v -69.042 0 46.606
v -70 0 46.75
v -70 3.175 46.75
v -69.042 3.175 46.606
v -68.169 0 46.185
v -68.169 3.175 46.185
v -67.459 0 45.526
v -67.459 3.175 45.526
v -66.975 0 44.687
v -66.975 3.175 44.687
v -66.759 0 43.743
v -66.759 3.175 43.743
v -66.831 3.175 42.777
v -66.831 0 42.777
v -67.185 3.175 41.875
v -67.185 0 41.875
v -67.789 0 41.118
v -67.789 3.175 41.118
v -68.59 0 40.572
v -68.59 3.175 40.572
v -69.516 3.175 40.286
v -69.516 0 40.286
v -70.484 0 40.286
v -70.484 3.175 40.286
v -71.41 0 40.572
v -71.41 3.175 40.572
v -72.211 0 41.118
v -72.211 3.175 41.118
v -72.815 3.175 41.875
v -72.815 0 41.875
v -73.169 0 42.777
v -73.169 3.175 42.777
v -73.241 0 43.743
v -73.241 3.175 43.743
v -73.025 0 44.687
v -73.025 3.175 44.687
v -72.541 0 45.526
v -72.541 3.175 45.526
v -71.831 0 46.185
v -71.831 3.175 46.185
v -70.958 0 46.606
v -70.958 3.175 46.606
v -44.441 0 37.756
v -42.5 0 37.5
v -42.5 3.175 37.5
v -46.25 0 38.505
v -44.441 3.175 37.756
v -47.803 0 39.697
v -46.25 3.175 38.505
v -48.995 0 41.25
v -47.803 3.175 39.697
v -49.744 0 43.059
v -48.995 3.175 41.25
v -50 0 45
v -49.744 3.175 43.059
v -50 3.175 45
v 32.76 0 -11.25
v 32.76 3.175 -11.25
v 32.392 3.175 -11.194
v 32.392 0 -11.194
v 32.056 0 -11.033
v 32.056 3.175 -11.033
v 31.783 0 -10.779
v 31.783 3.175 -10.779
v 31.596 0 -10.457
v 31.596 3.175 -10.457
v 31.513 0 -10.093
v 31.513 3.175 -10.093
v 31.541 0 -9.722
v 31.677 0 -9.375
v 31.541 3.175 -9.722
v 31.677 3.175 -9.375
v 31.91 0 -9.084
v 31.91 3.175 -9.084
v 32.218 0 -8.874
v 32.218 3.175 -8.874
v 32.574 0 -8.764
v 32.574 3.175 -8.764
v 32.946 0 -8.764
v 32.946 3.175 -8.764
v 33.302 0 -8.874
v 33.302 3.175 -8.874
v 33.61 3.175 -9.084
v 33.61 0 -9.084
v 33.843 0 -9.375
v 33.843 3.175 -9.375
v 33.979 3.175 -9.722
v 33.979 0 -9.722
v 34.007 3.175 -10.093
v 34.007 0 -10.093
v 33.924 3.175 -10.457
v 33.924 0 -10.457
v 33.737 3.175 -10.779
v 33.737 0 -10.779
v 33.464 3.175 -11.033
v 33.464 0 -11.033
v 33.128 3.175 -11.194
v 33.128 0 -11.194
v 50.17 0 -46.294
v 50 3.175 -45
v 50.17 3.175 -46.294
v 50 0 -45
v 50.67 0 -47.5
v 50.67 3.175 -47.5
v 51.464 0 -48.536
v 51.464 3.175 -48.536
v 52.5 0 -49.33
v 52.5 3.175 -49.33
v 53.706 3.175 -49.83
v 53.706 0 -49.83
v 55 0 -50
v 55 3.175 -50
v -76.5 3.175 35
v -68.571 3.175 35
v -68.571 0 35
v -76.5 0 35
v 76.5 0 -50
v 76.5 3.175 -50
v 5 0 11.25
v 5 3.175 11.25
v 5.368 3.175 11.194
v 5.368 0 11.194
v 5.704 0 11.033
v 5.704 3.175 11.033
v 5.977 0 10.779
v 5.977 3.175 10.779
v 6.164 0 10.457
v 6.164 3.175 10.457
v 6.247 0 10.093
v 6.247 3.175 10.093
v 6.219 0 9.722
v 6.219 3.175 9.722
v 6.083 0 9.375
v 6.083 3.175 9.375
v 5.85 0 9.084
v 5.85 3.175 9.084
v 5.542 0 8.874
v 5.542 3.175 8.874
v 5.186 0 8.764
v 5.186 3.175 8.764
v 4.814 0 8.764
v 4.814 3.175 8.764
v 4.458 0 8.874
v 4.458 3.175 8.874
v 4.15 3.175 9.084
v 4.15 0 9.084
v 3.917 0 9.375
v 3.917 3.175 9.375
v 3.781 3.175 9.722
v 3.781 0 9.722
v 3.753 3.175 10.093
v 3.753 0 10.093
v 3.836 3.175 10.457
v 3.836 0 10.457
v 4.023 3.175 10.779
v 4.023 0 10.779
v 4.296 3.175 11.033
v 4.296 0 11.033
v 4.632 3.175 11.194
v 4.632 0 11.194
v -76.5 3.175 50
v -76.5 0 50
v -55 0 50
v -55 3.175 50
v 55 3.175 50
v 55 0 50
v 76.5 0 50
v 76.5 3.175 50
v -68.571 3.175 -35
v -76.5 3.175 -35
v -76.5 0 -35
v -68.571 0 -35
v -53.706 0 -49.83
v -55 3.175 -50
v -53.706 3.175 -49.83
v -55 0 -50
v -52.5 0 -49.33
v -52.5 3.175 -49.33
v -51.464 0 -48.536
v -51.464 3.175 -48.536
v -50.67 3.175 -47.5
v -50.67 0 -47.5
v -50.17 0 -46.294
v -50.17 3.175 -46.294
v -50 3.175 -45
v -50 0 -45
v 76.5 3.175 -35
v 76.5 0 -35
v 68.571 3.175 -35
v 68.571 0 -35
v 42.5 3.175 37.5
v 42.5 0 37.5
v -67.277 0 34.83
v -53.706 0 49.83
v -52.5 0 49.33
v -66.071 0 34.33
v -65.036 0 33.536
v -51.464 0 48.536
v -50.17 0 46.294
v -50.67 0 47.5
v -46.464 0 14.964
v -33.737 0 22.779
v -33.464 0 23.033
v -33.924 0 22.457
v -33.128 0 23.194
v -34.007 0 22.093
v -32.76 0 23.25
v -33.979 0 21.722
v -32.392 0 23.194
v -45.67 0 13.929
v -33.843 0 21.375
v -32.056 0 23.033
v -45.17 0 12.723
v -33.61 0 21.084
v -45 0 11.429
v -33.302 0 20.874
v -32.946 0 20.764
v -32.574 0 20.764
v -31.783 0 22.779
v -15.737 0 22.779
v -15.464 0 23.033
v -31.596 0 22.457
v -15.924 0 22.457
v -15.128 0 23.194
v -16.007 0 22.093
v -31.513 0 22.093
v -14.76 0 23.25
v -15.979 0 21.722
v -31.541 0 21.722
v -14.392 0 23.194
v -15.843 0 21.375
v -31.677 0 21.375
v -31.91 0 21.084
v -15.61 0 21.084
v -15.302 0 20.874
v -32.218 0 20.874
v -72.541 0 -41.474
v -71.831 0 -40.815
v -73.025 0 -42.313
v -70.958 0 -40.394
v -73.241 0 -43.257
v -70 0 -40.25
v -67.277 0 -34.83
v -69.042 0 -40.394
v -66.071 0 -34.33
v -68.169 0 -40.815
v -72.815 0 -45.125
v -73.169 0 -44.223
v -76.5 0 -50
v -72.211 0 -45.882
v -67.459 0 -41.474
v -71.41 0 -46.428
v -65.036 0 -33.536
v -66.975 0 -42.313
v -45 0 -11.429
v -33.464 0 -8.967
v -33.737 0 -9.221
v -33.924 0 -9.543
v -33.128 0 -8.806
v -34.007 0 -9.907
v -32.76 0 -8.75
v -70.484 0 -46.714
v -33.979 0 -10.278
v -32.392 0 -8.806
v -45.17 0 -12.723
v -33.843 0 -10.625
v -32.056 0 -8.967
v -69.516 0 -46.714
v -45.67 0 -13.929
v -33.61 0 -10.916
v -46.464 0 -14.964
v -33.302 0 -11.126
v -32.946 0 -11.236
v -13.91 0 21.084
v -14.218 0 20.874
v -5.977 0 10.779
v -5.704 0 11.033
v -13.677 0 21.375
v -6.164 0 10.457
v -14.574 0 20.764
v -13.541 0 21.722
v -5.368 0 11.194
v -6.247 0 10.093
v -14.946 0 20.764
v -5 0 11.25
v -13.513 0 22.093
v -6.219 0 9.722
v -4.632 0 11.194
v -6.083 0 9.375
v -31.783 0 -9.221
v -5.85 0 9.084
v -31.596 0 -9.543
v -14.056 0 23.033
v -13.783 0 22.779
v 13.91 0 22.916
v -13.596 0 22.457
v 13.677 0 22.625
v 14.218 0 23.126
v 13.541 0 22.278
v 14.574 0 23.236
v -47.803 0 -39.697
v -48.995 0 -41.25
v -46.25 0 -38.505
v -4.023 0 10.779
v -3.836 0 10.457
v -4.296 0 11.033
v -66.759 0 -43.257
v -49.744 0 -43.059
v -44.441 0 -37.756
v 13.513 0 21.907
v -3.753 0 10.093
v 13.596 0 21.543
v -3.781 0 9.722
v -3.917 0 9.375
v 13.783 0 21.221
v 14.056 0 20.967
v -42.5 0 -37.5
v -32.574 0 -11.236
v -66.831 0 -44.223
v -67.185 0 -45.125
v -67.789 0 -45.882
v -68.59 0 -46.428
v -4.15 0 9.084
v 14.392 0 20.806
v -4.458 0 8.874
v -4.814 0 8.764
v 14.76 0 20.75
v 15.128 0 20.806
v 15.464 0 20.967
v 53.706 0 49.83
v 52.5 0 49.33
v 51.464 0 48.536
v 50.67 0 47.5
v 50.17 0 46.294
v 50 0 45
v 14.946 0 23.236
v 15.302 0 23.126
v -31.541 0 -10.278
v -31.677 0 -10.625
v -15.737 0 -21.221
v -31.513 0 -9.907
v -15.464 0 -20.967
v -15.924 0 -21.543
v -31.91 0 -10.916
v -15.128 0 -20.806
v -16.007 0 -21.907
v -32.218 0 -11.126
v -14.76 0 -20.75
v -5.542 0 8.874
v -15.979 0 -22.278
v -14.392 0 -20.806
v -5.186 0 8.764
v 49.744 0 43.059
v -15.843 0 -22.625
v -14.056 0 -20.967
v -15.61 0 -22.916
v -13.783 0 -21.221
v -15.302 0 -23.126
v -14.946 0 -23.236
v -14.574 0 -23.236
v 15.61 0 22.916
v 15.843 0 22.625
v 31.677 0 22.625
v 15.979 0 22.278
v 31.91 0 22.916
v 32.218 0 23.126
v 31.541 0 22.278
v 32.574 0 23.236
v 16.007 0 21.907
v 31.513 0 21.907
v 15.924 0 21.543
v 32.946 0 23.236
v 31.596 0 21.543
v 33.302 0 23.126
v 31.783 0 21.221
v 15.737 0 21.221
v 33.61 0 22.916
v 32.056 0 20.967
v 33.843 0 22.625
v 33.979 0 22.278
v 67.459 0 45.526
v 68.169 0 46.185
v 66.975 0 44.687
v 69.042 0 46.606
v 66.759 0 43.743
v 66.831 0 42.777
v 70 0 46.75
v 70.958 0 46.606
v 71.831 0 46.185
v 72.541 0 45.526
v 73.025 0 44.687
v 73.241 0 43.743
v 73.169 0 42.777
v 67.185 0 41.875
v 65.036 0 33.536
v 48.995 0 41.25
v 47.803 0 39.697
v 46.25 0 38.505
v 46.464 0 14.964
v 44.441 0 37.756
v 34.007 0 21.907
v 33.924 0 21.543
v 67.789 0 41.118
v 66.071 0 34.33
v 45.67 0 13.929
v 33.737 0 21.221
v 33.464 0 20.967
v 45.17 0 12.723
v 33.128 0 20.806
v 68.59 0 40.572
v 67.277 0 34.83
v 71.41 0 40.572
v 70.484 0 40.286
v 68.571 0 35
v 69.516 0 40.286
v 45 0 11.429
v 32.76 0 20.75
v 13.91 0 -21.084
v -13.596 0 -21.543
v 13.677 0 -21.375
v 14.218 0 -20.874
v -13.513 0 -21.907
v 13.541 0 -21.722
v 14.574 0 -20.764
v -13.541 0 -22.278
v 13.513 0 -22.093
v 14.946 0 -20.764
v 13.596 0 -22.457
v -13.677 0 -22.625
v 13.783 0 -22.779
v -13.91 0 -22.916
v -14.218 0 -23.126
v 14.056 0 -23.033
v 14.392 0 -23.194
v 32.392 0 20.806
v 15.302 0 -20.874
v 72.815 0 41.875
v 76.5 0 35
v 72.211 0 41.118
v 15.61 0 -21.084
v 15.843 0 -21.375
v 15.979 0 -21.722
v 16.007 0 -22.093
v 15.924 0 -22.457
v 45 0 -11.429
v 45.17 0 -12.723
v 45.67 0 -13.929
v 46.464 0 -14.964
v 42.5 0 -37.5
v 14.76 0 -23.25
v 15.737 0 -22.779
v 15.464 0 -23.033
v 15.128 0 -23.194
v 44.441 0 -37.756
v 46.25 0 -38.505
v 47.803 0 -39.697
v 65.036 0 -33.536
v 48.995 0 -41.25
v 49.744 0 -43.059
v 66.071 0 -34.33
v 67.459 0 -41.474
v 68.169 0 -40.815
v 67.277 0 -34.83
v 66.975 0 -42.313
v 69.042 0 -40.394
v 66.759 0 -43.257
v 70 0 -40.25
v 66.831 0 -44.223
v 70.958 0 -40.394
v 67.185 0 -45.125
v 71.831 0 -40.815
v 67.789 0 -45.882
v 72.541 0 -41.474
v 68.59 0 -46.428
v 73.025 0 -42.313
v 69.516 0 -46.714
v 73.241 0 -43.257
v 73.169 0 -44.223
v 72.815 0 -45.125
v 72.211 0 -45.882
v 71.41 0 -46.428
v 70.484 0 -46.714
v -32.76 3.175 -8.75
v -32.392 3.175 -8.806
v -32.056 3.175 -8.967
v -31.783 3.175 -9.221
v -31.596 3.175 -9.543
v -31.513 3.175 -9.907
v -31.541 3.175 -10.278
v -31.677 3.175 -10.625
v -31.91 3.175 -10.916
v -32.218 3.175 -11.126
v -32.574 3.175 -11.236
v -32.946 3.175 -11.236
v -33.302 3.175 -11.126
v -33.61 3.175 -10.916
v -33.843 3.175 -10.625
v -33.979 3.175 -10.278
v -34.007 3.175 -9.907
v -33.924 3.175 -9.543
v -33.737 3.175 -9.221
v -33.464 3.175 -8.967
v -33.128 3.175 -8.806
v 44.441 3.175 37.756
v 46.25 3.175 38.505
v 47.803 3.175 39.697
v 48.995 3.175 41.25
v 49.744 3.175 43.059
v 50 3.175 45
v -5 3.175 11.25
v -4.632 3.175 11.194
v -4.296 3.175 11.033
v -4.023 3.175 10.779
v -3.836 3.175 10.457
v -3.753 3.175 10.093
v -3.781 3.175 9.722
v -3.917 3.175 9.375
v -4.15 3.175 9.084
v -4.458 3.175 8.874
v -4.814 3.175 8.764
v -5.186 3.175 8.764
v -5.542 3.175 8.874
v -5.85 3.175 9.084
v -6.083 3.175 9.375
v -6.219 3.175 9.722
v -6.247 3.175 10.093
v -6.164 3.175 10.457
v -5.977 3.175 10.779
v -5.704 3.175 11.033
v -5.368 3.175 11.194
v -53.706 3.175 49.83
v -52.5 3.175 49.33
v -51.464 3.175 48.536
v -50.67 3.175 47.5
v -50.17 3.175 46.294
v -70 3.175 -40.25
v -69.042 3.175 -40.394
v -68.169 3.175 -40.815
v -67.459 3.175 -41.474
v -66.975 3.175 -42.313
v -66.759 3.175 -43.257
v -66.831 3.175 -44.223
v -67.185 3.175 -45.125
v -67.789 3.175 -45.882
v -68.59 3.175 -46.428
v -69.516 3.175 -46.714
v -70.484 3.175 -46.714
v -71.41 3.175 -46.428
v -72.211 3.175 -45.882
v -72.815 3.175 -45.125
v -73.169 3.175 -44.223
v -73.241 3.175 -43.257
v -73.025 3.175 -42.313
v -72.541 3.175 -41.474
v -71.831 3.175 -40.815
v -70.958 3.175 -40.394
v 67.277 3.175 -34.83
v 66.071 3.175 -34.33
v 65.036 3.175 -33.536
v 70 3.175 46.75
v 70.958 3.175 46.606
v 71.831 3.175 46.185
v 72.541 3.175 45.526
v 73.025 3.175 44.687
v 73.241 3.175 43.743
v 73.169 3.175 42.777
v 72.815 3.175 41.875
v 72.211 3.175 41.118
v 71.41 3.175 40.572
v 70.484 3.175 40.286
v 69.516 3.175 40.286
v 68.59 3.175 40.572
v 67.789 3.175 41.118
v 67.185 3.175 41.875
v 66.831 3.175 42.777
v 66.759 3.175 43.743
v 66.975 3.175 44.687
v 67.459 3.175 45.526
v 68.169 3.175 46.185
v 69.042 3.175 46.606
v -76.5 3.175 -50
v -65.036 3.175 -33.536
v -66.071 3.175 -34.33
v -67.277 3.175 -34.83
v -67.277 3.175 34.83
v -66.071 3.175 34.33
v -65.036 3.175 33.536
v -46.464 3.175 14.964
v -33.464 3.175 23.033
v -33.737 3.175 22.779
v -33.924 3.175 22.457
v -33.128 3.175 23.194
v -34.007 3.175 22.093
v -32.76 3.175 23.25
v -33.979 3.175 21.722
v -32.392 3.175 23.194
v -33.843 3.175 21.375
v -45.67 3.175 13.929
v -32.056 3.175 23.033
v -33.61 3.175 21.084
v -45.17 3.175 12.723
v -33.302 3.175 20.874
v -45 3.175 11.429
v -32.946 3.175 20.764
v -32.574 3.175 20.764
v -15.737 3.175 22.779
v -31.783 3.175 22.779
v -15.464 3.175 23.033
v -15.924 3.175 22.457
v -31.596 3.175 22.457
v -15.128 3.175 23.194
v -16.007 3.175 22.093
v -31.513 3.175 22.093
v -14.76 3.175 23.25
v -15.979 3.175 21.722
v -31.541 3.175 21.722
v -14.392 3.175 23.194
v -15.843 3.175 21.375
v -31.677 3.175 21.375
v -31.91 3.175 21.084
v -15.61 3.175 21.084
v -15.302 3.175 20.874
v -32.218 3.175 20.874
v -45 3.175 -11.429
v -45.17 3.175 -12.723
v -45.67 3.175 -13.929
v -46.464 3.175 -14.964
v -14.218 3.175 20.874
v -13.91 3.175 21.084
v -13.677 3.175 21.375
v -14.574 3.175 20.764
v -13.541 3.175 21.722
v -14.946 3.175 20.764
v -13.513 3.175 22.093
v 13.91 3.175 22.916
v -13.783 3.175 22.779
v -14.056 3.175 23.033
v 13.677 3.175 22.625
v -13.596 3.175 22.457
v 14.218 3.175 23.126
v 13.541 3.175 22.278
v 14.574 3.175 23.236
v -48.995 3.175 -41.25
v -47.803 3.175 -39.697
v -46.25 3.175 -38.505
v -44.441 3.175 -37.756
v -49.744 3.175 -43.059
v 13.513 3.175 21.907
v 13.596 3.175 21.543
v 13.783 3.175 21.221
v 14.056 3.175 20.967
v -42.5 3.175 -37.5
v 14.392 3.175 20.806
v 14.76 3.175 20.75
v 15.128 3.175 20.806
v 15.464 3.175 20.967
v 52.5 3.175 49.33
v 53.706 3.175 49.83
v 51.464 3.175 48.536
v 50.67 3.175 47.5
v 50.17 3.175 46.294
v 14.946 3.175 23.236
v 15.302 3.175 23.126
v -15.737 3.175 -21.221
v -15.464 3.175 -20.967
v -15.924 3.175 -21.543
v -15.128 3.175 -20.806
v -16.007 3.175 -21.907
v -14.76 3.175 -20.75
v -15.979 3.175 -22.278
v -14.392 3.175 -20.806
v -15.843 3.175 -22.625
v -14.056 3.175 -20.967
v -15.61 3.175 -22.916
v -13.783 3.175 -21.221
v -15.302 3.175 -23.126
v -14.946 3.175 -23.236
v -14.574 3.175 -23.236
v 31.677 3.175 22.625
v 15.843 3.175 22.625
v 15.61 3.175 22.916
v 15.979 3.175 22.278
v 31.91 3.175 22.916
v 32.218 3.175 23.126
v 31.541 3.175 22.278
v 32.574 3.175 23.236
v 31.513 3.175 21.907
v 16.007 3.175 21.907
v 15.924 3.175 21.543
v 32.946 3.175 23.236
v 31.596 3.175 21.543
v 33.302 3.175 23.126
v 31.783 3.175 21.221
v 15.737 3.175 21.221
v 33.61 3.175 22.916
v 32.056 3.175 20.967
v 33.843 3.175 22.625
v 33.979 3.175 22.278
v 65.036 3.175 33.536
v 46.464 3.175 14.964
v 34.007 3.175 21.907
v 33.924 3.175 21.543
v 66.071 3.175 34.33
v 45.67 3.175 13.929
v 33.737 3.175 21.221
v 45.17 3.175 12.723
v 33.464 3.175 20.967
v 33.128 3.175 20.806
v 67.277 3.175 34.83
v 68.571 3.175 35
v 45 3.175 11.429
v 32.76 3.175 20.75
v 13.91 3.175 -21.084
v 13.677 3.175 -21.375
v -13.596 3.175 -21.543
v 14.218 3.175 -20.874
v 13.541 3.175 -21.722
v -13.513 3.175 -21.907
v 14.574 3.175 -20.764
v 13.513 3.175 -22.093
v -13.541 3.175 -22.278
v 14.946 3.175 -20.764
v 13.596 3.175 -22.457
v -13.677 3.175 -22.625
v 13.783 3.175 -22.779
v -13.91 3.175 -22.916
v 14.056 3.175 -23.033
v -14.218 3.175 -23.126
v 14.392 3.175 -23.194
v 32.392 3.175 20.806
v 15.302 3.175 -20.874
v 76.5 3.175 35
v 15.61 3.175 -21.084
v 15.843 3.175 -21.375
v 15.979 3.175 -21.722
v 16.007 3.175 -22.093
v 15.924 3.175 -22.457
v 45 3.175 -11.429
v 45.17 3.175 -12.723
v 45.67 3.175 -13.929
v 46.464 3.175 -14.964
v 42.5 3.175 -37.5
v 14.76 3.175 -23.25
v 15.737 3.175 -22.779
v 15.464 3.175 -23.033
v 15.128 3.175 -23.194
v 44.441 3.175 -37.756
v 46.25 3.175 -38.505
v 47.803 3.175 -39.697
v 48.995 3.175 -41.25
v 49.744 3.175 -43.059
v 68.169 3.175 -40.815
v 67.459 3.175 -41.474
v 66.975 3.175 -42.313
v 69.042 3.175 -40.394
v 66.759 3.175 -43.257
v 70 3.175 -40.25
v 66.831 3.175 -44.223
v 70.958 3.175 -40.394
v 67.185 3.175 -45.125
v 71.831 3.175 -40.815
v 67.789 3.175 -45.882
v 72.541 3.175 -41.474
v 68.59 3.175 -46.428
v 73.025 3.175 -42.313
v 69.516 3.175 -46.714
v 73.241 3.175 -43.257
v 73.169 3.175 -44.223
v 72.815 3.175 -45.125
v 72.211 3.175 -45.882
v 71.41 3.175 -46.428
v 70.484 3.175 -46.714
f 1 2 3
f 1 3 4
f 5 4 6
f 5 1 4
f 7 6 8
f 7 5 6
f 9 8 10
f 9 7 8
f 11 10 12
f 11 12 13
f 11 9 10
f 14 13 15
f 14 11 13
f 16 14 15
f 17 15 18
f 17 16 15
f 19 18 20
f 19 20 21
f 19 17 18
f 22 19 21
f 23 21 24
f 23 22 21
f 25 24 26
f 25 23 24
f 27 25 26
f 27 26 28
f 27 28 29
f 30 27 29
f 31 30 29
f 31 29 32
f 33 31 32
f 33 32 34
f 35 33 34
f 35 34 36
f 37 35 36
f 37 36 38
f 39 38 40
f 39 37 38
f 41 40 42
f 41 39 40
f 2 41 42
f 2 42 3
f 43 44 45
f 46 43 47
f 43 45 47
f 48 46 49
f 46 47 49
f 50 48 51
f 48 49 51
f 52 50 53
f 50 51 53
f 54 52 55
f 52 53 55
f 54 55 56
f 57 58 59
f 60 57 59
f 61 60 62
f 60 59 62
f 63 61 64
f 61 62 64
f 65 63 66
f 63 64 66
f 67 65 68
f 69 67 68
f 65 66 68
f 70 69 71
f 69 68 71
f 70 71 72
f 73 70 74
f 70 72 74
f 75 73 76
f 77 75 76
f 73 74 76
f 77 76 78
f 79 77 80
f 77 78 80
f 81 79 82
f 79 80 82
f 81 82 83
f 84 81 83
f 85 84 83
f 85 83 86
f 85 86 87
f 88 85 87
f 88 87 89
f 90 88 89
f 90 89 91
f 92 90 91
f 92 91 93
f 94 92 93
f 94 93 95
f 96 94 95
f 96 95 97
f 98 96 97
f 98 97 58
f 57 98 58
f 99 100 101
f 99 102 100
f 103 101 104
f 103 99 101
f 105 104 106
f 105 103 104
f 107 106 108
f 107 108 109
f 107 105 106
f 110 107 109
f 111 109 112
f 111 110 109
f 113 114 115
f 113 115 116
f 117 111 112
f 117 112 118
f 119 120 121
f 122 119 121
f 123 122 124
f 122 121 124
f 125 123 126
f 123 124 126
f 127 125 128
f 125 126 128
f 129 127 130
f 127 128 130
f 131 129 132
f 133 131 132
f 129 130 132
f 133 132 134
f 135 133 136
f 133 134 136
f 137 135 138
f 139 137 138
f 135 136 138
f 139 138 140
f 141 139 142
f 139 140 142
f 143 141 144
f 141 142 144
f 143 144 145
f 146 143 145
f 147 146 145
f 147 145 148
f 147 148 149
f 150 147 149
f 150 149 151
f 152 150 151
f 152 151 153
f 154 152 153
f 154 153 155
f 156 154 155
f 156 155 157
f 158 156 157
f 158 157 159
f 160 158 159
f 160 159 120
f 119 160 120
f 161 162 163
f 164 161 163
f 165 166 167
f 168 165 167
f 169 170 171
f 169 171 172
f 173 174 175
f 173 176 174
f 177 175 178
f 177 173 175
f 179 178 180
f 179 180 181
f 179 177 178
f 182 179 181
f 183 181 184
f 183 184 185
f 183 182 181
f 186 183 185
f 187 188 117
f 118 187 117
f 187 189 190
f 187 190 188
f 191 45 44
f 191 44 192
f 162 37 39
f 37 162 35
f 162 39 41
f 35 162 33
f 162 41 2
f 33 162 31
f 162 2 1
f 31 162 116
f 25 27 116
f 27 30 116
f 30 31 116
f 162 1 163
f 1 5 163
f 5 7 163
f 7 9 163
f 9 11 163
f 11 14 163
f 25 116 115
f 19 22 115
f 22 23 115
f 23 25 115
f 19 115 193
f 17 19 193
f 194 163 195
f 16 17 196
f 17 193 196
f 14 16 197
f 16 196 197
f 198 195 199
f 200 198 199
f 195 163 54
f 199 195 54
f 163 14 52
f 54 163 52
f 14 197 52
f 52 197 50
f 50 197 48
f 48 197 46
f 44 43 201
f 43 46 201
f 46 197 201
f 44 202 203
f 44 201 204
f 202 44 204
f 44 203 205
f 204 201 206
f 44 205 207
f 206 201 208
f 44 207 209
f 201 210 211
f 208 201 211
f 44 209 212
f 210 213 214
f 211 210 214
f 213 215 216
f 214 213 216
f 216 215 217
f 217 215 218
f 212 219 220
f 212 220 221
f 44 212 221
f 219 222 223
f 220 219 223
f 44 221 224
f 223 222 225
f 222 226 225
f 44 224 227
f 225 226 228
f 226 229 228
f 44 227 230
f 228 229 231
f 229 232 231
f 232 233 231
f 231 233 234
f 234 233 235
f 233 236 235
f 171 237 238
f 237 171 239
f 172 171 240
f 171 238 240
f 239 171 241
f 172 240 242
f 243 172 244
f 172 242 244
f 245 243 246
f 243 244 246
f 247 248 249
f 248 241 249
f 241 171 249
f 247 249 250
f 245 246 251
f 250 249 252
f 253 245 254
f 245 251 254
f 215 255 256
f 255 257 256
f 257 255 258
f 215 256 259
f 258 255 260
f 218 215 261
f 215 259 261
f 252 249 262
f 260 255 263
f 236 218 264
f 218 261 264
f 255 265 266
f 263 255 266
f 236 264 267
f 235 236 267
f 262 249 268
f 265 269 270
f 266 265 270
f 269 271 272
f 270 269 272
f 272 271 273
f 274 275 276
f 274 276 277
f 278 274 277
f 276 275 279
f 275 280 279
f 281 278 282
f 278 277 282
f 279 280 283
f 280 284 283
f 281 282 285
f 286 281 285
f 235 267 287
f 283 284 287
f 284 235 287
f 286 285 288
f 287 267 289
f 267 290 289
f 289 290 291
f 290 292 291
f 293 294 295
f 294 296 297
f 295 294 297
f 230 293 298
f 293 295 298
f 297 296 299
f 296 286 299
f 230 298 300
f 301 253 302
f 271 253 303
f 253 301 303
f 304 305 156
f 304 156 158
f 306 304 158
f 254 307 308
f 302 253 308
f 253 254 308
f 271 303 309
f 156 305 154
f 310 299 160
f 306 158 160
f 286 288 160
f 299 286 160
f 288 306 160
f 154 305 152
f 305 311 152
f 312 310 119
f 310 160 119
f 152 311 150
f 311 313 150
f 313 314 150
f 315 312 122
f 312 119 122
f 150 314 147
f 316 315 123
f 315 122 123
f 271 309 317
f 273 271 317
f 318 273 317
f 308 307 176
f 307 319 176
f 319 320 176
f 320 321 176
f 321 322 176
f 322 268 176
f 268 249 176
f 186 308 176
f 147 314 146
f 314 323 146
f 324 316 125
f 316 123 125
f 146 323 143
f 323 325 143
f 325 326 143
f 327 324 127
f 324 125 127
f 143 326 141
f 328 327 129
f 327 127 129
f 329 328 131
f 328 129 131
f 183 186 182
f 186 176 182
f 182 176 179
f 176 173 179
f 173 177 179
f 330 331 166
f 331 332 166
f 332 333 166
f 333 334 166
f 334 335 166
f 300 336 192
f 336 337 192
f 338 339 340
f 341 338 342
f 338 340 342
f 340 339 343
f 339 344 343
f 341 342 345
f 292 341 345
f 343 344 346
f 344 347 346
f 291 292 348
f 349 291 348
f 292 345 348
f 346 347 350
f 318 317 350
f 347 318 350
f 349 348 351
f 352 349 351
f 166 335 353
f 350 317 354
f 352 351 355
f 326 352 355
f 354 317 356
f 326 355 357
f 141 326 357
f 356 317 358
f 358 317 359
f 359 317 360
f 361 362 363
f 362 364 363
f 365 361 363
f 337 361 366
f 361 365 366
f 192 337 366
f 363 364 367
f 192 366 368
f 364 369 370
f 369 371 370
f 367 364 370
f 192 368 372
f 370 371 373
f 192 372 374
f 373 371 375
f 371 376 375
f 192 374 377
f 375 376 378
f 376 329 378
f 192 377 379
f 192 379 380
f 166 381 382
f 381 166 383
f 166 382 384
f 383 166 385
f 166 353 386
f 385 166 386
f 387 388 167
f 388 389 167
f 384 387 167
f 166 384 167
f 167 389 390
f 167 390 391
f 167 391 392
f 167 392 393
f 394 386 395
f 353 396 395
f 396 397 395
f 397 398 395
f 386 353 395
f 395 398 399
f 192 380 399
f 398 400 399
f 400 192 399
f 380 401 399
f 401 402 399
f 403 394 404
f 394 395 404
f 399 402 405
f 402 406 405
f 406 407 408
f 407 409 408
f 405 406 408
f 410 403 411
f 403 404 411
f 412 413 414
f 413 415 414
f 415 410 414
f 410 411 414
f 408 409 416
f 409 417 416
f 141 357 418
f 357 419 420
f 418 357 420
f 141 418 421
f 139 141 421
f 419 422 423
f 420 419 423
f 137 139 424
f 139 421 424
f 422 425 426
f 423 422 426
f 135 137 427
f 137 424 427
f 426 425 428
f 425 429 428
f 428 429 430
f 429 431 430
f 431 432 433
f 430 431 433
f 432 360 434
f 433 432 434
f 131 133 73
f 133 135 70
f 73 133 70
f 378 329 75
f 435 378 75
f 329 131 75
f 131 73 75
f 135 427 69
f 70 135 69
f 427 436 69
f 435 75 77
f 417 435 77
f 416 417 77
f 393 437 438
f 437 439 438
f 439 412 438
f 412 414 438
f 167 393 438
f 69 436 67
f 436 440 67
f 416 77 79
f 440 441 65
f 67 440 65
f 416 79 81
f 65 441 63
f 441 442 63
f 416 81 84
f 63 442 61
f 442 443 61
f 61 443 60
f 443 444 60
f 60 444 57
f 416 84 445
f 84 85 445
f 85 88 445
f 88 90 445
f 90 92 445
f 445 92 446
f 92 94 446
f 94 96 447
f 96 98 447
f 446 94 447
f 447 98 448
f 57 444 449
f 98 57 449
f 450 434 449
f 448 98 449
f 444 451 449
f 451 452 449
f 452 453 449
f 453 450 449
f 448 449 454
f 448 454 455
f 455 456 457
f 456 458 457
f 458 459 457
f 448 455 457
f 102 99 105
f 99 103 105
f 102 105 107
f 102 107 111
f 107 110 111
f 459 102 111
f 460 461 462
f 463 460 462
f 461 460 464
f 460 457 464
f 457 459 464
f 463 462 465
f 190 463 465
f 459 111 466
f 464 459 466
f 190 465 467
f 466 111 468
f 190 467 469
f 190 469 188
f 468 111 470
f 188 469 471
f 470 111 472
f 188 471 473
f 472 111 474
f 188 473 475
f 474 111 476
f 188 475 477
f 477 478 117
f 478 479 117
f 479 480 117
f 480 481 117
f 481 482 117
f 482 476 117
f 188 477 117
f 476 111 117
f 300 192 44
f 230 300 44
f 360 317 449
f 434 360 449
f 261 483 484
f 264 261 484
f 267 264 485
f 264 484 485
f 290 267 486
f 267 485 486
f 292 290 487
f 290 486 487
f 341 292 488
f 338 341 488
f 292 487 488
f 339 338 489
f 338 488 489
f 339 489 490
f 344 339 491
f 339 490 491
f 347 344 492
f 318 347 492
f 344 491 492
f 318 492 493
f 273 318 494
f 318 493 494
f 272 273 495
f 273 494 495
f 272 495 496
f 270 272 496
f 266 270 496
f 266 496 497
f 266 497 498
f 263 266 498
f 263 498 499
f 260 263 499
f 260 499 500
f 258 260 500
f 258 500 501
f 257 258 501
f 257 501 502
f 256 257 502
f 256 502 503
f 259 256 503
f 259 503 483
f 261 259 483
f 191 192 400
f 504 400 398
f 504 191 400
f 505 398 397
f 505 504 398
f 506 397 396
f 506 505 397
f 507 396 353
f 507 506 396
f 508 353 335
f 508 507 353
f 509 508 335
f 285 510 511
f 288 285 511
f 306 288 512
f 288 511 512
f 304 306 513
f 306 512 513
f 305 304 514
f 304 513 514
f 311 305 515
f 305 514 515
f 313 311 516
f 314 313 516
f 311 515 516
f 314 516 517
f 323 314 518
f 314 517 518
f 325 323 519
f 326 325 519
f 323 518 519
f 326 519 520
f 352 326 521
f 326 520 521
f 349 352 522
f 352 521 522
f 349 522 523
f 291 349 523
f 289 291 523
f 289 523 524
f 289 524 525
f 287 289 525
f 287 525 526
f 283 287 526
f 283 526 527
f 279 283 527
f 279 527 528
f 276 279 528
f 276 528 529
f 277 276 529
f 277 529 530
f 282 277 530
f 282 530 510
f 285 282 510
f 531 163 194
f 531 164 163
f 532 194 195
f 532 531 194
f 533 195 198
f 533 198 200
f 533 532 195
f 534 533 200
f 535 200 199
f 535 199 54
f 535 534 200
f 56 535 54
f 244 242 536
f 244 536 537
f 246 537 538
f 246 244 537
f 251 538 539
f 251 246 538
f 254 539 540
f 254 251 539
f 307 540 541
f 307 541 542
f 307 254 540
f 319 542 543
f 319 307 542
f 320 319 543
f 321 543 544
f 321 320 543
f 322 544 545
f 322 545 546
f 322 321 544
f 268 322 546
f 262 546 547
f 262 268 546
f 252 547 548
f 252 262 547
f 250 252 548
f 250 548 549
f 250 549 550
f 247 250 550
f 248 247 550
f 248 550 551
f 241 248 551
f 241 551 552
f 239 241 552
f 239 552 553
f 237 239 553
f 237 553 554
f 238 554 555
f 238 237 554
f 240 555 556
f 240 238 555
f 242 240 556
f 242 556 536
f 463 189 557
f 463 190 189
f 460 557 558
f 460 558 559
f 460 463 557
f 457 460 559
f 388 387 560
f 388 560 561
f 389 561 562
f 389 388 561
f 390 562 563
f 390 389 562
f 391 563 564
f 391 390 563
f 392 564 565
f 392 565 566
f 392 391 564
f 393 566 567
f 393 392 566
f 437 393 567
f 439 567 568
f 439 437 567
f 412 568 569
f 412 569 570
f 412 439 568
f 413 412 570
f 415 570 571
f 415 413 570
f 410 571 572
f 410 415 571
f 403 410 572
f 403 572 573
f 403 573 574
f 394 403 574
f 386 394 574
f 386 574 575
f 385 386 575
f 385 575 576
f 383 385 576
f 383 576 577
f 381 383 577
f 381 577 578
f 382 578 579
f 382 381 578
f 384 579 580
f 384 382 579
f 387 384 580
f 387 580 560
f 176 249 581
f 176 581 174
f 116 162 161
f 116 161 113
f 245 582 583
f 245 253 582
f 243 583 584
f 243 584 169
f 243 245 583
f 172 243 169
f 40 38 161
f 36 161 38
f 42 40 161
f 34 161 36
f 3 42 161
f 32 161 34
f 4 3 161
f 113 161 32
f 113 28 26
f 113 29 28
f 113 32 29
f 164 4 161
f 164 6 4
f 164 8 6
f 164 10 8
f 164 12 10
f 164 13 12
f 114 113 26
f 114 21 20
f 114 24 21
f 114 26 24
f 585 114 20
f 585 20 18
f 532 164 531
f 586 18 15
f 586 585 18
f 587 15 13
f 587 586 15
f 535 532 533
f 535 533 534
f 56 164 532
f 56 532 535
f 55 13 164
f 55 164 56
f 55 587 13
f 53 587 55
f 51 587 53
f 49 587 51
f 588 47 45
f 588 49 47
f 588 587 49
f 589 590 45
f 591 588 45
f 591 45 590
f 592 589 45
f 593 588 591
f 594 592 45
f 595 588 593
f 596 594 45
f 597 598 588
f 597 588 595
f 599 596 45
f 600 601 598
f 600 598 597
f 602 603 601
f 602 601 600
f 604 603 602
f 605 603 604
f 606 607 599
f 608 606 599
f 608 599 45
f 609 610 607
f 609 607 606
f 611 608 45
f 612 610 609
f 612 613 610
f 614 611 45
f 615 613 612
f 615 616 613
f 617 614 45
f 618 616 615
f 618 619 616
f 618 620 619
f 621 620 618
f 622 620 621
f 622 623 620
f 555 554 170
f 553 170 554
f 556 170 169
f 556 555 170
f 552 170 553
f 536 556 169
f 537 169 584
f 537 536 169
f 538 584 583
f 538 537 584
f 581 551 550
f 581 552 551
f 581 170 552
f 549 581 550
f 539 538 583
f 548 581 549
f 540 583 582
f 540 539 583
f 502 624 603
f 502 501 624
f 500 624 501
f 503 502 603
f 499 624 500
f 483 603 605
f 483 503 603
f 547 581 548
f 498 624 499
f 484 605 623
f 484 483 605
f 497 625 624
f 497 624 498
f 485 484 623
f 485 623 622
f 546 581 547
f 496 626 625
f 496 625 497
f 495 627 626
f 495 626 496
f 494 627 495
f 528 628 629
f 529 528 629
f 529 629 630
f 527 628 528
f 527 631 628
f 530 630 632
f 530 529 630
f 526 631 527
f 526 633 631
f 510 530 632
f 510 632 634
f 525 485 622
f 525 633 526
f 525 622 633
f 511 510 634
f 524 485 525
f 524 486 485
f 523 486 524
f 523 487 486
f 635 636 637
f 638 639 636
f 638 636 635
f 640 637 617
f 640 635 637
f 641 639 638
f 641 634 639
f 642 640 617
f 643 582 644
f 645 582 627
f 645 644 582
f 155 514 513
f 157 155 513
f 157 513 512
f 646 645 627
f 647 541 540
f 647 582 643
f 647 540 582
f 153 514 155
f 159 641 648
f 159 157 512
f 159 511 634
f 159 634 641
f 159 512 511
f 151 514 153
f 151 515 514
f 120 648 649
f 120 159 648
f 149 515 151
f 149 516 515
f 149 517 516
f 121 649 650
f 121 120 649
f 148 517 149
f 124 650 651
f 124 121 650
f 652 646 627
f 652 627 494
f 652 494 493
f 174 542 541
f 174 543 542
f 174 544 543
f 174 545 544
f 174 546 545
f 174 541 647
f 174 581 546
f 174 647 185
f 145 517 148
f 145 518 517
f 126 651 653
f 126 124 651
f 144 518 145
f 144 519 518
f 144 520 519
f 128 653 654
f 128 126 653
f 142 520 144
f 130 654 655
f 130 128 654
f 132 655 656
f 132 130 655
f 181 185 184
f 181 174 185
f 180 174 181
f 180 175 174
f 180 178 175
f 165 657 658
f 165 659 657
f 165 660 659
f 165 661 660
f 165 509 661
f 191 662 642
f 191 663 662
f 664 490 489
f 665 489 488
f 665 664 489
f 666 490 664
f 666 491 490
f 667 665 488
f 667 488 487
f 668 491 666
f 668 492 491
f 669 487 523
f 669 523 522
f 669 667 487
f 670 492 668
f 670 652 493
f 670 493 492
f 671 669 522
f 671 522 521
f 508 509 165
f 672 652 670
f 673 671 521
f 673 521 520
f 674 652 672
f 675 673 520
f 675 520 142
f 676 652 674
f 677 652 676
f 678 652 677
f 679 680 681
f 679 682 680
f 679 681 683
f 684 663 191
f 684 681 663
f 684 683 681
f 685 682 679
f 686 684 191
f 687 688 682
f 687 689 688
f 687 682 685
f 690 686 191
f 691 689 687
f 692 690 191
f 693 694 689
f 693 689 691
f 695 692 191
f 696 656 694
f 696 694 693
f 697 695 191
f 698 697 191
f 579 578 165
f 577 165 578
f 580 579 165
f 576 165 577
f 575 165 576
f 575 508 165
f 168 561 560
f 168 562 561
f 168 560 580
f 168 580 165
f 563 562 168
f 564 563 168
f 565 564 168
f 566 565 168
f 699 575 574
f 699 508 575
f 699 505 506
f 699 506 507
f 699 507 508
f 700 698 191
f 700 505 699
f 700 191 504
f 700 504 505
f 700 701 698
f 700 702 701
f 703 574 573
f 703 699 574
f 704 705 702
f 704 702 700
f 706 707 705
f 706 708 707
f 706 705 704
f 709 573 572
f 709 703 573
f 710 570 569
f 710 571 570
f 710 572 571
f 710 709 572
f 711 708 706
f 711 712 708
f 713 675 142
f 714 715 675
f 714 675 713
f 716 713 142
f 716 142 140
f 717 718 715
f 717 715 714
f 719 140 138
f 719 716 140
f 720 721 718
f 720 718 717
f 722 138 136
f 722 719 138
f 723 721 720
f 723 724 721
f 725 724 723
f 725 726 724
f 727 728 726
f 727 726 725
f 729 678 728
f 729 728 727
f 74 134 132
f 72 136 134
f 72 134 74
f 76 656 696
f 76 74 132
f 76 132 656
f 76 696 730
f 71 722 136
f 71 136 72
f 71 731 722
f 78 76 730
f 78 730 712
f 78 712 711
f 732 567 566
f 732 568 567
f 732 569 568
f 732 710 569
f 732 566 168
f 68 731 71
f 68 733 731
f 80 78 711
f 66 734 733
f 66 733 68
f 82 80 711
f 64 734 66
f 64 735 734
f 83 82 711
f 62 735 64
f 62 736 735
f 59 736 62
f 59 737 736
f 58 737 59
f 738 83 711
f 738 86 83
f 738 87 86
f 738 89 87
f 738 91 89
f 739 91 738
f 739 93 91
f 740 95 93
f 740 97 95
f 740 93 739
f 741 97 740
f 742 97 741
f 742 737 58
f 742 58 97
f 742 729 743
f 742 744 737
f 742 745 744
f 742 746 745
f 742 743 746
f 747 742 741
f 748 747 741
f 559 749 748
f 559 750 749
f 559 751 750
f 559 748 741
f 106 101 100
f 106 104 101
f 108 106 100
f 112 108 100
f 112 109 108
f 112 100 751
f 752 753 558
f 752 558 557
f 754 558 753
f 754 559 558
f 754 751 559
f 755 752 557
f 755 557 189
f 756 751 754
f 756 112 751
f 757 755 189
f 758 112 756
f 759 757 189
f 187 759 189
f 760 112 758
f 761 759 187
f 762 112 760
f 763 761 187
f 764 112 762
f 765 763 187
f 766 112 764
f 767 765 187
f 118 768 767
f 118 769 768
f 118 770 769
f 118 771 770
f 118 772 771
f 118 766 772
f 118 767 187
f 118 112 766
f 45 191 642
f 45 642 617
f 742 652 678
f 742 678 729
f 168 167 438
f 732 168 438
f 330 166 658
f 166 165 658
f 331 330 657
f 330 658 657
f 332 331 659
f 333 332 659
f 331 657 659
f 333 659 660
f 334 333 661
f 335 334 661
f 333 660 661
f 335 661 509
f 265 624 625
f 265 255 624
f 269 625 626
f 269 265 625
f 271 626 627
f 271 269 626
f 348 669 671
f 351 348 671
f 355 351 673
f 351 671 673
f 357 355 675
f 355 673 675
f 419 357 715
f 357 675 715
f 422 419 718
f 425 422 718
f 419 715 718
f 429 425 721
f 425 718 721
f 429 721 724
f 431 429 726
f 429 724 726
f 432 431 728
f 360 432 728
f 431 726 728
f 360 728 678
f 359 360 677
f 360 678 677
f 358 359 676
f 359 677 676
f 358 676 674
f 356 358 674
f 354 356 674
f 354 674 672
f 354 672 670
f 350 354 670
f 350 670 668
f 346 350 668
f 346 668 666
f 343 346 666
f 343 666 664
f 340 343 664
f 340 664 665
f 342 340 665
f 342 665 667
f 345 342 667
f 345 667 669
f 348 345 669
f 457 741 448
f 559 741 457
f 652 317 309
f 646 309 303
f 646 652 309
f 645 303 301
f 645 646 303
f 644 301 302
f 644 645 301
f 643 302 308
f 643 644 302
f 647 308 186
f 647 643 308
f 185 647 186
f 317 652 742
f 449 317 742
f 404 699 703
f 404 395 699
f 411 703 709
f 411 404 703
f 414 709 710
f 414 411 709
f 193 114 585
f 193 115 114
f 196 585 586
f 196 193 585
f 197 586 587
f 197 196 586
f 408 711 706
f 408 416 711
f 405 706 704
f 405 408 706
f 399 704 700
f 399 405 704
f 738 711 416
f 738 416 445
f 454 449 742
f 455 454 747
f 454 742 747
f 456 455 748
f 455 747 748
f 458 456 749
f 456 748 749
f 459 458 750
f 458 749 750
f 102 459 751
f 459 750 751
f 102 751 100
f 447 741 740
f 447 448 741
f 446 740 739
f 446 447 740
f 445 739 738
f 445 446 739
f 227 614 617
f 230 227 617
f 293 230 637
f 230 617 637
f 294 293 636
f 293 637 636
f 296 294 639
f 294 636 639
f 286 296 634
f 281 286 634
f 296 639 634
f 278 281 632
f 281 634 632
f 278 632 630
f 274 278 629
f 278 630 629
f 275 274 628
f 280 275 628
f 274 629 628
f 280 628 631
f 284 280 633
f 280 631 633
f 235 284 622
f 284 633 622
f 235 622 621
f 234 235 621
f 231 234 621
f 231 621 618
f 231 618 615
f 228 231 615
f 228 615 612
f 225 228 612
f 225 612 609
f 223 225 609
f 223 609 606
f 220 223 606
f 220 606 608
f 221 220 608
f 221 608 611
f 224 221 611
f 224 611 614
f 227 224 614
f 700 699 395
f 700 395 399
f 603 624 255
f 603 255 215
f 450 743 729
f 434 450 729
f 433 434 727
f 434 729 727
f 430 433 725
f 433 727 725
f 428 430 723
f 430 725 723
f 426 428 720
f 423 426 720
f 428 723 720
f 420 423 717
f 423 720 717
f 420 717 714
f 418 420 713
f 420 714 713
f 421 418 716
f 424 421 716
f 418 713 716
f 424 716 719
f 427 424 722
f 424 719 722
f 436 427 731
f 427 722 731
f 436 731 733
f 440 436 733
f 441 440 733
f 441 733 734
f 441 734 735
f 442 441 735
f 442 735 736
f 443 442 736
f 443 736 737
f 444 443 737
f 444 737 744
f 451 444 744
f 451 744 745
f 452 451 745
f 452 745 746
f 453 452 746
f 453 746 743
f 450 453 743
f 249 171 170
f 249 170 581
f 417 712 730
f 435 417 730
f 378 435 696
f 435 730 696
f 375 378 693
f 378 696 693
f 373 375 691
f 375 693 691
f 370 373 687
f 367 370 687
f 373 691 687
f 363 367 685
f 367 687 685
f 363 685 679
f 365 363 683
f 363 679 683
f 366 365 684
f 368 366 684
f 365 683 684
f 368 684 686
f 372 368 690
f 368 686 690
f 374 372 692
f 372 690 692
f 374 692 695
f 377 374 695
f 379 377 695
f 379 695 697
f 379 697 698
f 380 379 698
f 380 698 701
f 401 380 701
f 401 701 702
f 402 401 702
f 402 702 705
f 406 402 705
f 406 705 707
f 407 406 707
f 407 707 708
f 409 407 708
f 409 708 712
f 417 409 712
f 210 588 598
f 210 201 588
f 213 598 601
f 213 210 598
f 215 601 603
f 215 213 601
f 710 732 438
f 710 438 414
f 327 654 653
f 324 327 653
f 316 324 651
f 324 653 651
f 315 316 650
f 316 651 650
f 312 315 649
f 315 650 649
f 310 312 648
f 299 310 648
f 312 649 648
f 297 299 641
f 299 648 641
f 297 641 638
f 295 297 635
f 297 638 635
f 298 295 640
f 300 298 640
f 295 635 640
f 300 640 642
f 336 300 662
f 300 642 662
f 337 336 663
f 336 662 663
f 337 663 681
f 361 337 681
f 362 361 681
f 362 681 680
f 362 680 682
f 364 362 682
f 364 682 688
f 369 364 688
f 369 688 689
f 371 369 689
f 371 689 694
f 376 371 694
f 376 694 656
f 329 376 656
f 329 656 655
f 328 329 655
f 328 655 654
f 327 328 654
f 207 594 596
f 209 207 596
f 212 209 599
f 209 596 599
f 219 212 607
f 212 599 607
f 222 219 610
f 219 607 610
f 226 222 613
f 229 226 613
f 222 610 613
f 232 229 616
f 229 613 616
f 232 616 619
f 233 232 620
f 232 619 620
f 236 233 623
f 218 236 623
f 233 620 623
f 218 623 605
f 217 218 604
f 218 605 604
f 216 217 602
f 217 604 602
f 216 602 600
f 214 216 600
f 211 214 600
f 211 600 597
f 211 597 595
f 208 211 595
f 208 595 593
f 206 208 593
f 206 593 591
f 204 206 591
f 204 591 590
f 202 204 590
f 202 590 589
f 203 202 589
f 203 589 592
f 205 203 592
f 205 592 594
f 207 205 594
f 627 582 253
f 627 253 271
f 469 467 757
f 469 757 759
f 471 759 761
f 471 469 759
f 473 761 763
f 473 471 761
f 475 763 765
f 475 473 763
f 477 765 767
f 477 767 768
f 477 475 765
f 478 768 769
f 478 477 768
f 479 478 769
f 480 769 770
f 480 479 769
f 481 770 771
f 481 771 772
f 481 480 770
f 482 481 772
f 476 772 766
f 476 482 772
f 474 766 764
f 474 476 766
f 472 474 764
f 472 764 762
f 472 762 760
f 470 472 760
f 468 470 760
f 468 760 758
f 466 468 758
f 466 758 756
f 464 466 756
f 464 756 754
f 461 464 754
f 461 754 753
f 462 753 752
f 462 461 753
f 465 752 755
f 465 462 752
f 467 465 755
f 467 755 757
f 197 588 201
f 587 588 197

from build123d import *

# Parameters (mm, degrees)
SKETCH1_W           = 153
SKETCH1_H           = 100
SKETCH1_R           = 3.25
BOSS_EXTRUDE1_DEPTH = 3.175
CUT_EXTRUDE1_DEPTH  = 92.4457797
CUT_EXTRUDE2_DEPTH  = 92.4457797
FILLET1_R           = 5
SKETCH4_R           = 1.25
CUT_EXTRUDE3_DEPTH  = 92.4457797
SKETCH5_R           = 1.25
CUT_EXTRUDE4_DEPTH  = 92.4457797
SKETCH6_W           = 85
SKETCH6_H           = 12.5
CUT_EXTRUDE5_DEPTH  = 92.4457797


with BuildPart() as part:
    # Sketch1 → Boss-Extrude1 (new body)
    with BuildSketch(Plane(origin=(0, 0, 0), x_dir=(1, 0, 0), z_dir=(0, 1, 0))):
        Rectangle(SKETCH1_W, SKETCH1_H)
        with Locations(Location((-70, 43.5, 0), (0, 0, 270))):
            Circle(SKETCH1_R, mode=Mode.SUBTRACT)
        with Locations(Location((70, 43.5, 0), (0, 0, 270))):
            Circle(SKETCH1_R, mode=Mode.SUBTRACT)
        with Locations(Location((70, -43.5, 0), (0, 0, 270))):
            Circle(SKETCH1_R, mode=Mode.SUBTRACT)
        with Locations(Location((-70, -43.5, 0), (0, 0, 270))):
            Circle(SKETCH1_R, mode=Mode.SUBTRACT)
    extrude(amount=BOSS_EXTRUDE1_DEPTH)

    # Sketch2 → Cut-Extrude1 (cut, through all)
    with BuildSketch(Plane(origin=(0, 3.175, 0), x_dir=(1, 0, 0), z_dir=(0, 1, 0))):
        Polygon((-76.5, 35), (-66.5, 35), (-45, 13.5), (-45, -13.5), (-66.5, -35), (-76.5, -35), align=None)
        Polygon((76.5, -35), (66.5, -35), (45, -13.5), (45, 13.5), (66.5, 35), (76.5, 35), align=None)
    extrude(amount=-CUT_EXTRUDE1_DEPTH, mode=Mode.SUBTRACT)

    # Sketch3 → Cut-Extrude2 (cut, through all)
    with BuildSketch(Plane(origin=(0, 3.175, 0), x_dir=(1, 0, 0), z_dir=(0, 1, 0))):
        with BuildLine():
            Line((-50, 45), (-50, 60))
            ThreePointArc((-50, 60), (-42.5, 67.5), (-35, 60))
            Line((-35, 60), (-35, 45))
            ThreePointArc((-35, 45), (-42.5, 37.5), (-50, 45))
        make_face()
        with BuildLine():
            Line((50, 45), (50, 60))
            ThreePointArc((50, 60), (42.5, 67.5), (35, 60))
            Line((35, 60), (35, 45))
            ThreePointArc((35, 45), (42.5, 37.5), (50, 45))
        make_face()
        with BuildLine():
            Line((-50, -45), (-50, -60))
            ThreePointArc((-50, -60), (-42.5, -67.5), (-35, -60))
            Line((-35, -60), (-35, -45))
            ThreePointArc((-35, -45), (-42.5, -37.5), (-50, -45))
        make_face()
        with BuildLine():
            Line((50, -45), (50, -60))
            ThreePointArc((50, -60), (42.5, -67.5), (35, -60))
            Line((35, -60), (35, -45))
            ThreePointArc((35, -45), (42.5, -37.5), (50, -45))
        make_face()
    extrude(amount=-CUT_EXTRUDE2_DEPTH, mode=Mode.SUBTRACT)

    # Fillet1
    fillet1_edges = [part.edges().sort_by_distance(p)[0] for p in [
        (-45, 1.5875, -13.5),
        (-45, 1.5875, 13.5),
        (-66.5, 1.5875, 35),
        (-50, 1.5875, 50),
        (-35, 1.5875, 50),
        (35, 1.5875, 50),
        (50, 1.5875, 50),
        (66.5, 1.5875, 35),
        (45, 1.5875, 13.5),
        (45, 1.5875, -13.5),
        (66.5, 1.5875, -35),
        (50, 1.5875, -50),
        (35, 1.5875, -50),
        (-35, 1.5875, -50),
        (-50, 1.5875, -50),
        (-66.5, 1.5875, -35),
    ]]
    fillet(fillet1_edges, radius=FILLET1_R - 0.0001)  # a hair under: the kernel refuses the full size

    # Sketch4 → Cut-Extrude3 (cut, through all)
    with BuildSketch(Plane(origin=(0, 3.175, 0), x_dir=(1, 0, 0), z_dir=(0, 1, 0))):
        with Locations(Location((-32.76, 10, 0), (0, 0, 270))):
            Circle(SKETCH4_R)
        with Locations(Location((-14.76, 22, 0), (0, 0, 270))):
            Circle(SKETCH4_R)
        with Locations(Location((-14.76, -22, 0), (0, 0, 270))):
            Circle(SKETCH4_R)
        with Locations(Location((-32.76, -22, 0), (0, 0, 270))):
            Circle(SKETCH4_R)
        with Locations(Location((32.76, -22, 0), (0, 0, 90))):
            Circle(SKETCH4_R)
        with Locations(Location((14.76, -22, 0), (0, 0, 90))):
            Circle(SKETCH4_R)
        with Locations(Location((14.76, 22, 0), (0, 0, 90))):
            Circle(SKETCH4_R)
        with Locations(Location((32.76, 10, 0), (0, 0, 90))):
            Circle(SKETCH4_R)
    extrude(amount=-CUT_EXTRUDE3_DEPTH, mode=Mode.SUBTRACT)

    # Sketch5 → Cut-Extrude4 (cut, through all)
    with BuildSketch(Plane(origin=(0, 3.175, 0), x_dir=(1, 0, 0), z_dir=(0, 1, 0))):
        with Locations(Location((-5, -10, 0), (0, 0, 270))):
            Circle(SKETCH5_R)
        with Locations(Location((5, -10, 0), (0, 0, 270))):
            Circle(SKETCH5_R)
    extrude(amount=-CUT_EXTRUDE4_DEPTH, mode=Mode.SUBTRACT)

    # Sketch6 → Cut-Extrude5 (cut, through all)
    with BuildSketch(Plane(origin=(0, 3.175, 0), x_dir=(1, 0, 0), z_dir=(0, 1, 0))):
        with Locations((0, 43.75)):
            Rectangle(SKETCH6_W, SKETCH6_H)
        with Locations((0, -43.75)):
            Rectangle(SKETCH6_W, SKETCH6_H)
    extrude(amount=-CUT_EXTRUDE5_DEPTH, mode=Mode.SUBTRACT)


solid = part.part
